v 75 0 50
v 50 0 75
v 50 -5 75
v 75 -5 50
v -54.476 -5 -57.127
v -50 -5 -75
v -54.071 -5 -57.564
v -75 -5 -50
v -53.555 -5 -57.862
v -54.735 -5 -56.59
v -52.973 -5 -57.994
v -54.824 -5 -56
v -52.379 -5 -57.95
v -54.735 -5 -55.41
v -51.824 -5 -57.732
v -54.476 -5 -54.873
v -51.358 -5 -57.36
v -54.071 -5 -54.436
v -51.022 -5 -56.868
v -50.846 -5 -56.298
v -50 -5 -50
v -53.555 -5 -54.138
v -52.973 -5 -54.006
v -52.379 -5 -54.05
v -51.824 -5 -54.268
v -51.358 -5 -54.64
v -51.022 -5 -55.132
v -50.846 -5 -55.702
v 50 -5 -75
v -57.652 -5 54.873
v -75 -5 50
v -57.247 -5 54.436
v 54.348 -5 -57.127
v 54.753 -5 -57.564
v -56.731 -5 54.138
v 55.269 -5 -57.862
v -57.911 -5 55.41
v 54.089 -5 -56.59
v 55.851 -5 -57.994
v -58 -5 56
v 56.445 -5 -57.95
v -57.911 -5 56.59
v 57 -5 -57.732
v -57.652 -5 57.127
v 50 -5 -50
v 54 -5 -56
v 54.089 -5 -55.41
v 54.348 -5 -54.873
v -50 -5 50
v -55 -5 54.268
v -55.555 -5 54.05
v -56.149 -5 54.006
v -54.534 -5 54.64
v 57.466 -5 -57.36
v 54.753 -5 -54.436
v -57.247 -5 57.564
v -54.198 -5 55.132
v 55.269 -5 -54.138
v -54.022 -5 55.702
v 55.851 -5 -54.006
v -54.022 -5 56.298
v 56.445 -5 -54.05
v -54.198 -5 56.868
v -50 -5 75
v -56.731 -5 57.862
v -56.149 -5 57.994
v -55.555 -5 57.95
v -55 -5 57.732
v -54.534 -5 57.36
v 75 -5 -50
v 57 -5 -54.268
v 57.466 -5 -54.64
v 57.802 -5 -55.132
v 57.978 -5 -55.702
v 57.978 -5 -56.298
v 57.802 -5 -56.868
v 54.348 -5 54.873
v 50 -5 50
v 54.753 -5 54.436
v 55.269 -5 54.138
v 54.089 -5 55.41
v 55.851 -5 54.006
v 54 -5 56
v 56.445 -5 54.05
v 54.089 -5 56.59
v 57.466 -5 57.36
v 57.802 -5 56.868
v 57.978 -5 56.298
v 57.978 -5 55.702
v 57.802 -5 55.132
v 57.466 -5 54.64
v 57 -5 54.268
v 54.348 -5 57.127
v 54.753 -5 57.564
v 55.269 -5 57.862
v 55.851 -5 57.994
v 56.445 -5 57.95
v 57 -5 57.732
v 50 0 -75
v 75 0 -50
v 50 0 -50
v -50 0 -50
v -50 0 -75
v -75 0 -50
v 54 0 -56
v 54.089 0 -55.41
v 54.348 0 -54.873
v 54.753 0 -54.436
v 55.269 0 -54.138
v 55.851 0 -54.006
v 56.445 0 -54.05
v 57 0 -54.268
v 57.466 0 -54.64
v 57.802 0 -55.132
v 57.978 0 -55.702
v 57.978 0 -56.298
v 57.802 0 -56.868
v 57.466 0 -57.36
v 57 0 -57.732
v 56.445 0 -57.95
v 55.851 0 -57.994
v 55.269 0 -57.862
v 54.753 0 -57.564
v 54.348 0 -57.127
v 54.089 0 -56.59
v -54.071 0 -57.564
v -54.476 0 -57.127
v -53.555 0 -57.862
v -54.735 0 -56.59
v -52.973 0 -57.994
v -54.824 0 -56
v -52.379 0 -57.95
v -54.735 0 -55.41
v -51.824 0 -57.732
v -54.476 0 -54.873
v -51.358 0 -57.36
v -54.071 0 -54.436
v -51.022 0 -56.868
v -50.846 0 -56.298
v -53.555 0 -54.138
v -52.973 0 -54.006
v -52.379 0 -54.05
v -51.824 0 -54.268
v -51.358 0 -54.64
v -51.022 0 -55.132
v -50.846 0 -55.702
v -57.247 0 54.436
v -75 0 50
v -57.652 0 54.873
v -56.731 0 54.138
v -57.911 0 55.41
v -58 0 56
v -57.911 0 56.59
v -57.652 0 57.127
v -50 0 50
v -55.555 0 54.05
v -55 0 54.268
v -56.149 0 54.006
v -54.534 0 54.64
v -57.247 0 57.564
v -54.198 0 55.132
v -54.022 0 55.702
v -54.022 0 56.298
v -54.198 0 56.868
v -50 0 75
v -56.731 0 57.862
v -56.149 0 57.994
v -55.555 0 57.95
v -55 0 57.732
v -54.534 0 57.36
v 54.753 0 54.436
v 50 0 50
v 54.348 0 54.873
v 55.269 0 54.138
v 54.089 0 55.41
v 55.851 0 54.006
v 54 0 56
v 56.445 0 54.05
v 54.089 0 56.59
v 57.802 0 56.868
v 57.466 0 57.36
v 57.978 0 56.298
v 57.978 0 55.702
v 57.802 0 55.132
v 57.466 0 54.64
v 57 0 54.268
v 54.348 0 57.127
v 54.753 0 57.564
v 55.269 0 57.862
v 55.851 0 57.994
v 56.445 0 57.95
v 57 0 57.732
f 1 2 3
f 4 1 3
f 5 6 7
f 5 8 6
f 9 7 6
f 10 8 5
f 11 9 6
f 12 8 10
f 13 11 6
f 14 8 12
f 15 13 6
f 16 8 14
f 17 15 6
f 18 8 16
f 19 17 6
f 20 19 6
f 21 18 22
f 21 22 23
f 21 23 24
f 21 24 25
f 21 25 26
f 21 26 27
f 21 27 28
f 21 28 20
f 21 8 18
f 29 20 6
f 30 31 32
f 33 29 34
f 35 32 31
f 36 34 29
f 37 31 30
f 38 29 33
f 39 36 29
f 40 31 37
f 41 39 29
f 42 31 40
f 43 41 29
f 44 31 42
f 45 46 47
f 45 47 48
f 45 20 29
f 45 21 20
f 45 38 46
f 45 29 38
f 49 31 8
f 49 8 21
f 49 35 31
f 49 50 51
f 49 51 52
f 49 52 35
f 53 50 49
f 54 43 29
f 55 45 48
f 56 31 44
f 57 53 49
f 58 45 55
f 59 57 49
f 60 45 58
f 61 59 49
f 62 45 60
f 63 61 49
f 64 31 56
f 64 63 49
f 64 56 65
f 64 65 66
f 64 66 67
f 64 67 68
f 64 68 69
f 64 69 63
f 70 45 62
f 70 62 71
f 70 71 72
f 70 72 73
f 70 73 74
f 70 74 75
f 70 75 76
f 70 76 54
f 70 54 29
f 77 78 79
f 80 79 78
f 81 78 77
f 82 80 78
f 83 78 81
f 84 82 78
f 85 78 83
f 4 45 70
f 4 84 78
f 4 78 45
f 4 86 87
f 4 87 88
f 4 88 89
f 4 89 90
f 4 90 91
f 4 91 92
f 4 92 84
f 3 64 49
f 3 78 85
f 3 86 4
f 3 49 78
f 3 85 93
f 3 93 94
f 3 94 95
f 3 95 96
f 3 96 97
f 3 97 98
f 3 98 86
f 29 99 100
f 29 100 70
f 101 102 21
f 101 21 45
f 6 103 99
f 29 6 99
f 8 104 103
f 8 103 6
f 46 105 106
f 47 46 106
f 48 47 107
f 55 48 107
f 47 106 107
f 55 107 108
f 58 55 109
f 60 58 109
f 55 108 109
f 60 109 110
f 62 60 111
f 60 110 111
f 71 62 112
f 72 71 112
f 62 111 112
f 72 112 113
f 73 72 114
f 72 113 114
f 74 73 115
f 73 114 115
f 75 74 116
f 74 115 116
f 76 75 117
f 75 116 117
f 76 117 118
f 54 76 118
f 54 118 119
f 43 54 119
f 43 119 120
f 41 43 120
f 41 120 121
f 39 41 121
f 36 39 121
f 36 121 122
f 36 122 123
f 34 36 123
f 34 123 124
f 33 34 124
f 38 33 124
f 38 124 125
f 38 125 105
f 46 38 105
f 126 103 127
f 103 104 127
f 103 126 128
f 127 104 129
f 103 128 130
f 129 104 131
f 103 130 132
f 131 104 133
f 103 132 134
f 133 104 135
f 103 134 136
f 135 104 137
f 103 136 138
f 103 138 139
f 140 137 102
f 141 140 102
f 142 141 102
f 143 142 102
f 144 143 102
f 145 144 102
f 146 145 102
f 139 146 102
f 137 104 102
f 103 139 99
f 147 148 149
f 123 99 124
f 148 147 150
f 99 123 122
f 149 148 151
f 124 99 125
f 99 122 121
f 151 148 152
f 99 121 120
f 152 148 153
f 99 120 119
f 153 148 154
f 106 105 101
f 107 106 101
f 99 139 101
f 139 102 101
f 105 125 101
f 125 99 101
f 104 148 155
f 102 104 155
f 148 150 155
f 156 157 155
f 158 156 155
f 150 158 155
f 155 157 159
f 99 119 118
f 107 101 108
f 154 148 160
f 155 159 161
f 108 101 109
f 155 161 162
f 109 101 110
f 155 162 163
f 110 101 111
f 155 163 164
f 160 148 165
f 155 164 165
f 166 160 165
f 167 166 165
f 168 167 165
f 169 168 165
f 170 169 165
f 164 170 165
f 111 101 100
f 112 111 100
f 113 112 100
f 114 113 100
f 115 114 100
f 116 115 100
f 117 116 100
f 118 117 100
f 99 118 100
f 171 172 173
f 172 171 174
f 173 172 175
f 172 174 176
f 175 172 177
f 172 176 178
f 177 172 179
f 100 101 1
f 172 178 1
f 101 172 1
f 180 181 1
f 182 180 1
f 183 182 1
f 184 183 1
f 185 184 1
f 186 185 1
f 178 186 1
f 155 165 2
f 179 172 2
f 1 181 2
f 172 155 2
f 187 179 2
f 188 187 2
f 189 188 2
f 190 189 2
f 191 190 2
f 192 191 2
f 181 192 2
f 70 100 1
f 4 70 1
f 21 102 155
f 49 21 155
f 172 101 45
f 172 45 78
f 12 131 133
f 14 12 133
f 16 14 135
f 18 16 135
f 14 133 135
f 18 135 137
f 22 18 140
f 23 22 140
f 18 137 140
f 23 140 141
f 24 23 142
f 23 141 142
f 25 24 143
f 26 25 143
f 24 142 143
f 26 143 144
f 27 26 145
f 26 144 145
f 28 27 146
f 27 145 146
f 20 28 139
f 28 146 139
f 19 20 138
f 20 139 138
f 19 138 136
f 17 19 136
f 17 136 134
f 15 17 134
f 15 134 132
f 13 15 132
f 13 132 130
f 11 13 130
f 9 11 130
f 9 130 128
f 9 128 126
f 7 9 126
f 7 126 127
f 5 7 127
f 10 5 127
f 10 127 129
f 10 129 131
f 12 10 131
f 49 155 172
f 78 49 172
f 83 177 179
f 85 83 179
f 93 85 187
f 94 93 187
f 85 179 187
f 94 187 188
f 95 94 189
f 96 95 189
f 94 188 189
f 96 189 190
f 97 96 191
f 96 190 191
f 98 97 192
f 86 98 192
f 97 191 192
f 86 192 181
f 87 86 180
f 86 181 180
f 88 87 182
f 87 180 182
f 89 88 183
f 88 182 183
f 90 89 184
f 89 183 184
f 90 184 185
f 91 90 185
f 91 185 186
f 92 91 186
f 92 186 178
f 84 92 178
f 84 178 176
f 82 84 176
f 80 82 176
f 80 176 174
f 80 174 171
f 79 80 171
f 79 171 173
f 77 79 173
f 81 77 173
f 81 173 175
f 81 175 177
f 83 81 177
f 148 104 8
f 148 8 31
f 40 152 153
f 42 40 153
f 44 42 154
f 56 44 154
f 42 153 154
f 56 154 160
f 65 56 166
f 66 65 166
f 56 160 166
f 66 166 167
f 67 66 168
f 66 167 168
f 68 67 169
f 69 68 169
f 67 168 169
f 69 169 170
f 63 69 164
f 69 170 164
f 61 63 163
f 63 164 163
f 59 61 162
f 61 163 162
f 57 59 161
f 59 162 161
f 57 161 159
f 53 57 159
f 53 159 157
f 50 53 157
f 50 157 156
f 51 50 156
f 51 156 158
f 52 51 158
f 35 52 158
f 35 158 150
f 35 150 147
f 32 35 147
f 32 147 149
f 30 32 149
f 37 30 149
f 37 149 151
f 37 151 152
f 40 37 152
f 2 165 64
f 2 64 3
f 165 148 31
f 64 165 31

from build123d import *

# Parameters (mm, degrees)
F0_W     = 150
F0_H     = 150
F0_W_2   = 100
F0_H_2   = 100
F1_DEPTH = 5
F2_SIZE  = 25
F4_D     = 4


with BuildPart() as f1:
    # F0 (on Front) → F1 (new body)
    with BuildSketch(Plane.XZ):
        Rectangle(F0_W, F0_H)
        Rectangle(F0_W_2, F0_H_2, mode=Mode.SUBTRACT)
    extrude(amount=F1_DEPTH)

    # F2
    f2_edges = [f1.edges().sort_by_distance(p)[0] for p in [
        (-75, -2.5, 75),
        (75, -2.5, 75),
        (-75, -2.5, -75),
        (75, -2.5, -75),
    ]]
    chamfer(f2_edges, length=F2_SIZE)

    # F4 (through all)
    with Locations(Plane.XZ.offset(5)):
        with Locations((56, 56), (56, -56), (-52.823993, -56), (-56, 56)):
            Hole(F4_D / 2)


solid = f1.part
